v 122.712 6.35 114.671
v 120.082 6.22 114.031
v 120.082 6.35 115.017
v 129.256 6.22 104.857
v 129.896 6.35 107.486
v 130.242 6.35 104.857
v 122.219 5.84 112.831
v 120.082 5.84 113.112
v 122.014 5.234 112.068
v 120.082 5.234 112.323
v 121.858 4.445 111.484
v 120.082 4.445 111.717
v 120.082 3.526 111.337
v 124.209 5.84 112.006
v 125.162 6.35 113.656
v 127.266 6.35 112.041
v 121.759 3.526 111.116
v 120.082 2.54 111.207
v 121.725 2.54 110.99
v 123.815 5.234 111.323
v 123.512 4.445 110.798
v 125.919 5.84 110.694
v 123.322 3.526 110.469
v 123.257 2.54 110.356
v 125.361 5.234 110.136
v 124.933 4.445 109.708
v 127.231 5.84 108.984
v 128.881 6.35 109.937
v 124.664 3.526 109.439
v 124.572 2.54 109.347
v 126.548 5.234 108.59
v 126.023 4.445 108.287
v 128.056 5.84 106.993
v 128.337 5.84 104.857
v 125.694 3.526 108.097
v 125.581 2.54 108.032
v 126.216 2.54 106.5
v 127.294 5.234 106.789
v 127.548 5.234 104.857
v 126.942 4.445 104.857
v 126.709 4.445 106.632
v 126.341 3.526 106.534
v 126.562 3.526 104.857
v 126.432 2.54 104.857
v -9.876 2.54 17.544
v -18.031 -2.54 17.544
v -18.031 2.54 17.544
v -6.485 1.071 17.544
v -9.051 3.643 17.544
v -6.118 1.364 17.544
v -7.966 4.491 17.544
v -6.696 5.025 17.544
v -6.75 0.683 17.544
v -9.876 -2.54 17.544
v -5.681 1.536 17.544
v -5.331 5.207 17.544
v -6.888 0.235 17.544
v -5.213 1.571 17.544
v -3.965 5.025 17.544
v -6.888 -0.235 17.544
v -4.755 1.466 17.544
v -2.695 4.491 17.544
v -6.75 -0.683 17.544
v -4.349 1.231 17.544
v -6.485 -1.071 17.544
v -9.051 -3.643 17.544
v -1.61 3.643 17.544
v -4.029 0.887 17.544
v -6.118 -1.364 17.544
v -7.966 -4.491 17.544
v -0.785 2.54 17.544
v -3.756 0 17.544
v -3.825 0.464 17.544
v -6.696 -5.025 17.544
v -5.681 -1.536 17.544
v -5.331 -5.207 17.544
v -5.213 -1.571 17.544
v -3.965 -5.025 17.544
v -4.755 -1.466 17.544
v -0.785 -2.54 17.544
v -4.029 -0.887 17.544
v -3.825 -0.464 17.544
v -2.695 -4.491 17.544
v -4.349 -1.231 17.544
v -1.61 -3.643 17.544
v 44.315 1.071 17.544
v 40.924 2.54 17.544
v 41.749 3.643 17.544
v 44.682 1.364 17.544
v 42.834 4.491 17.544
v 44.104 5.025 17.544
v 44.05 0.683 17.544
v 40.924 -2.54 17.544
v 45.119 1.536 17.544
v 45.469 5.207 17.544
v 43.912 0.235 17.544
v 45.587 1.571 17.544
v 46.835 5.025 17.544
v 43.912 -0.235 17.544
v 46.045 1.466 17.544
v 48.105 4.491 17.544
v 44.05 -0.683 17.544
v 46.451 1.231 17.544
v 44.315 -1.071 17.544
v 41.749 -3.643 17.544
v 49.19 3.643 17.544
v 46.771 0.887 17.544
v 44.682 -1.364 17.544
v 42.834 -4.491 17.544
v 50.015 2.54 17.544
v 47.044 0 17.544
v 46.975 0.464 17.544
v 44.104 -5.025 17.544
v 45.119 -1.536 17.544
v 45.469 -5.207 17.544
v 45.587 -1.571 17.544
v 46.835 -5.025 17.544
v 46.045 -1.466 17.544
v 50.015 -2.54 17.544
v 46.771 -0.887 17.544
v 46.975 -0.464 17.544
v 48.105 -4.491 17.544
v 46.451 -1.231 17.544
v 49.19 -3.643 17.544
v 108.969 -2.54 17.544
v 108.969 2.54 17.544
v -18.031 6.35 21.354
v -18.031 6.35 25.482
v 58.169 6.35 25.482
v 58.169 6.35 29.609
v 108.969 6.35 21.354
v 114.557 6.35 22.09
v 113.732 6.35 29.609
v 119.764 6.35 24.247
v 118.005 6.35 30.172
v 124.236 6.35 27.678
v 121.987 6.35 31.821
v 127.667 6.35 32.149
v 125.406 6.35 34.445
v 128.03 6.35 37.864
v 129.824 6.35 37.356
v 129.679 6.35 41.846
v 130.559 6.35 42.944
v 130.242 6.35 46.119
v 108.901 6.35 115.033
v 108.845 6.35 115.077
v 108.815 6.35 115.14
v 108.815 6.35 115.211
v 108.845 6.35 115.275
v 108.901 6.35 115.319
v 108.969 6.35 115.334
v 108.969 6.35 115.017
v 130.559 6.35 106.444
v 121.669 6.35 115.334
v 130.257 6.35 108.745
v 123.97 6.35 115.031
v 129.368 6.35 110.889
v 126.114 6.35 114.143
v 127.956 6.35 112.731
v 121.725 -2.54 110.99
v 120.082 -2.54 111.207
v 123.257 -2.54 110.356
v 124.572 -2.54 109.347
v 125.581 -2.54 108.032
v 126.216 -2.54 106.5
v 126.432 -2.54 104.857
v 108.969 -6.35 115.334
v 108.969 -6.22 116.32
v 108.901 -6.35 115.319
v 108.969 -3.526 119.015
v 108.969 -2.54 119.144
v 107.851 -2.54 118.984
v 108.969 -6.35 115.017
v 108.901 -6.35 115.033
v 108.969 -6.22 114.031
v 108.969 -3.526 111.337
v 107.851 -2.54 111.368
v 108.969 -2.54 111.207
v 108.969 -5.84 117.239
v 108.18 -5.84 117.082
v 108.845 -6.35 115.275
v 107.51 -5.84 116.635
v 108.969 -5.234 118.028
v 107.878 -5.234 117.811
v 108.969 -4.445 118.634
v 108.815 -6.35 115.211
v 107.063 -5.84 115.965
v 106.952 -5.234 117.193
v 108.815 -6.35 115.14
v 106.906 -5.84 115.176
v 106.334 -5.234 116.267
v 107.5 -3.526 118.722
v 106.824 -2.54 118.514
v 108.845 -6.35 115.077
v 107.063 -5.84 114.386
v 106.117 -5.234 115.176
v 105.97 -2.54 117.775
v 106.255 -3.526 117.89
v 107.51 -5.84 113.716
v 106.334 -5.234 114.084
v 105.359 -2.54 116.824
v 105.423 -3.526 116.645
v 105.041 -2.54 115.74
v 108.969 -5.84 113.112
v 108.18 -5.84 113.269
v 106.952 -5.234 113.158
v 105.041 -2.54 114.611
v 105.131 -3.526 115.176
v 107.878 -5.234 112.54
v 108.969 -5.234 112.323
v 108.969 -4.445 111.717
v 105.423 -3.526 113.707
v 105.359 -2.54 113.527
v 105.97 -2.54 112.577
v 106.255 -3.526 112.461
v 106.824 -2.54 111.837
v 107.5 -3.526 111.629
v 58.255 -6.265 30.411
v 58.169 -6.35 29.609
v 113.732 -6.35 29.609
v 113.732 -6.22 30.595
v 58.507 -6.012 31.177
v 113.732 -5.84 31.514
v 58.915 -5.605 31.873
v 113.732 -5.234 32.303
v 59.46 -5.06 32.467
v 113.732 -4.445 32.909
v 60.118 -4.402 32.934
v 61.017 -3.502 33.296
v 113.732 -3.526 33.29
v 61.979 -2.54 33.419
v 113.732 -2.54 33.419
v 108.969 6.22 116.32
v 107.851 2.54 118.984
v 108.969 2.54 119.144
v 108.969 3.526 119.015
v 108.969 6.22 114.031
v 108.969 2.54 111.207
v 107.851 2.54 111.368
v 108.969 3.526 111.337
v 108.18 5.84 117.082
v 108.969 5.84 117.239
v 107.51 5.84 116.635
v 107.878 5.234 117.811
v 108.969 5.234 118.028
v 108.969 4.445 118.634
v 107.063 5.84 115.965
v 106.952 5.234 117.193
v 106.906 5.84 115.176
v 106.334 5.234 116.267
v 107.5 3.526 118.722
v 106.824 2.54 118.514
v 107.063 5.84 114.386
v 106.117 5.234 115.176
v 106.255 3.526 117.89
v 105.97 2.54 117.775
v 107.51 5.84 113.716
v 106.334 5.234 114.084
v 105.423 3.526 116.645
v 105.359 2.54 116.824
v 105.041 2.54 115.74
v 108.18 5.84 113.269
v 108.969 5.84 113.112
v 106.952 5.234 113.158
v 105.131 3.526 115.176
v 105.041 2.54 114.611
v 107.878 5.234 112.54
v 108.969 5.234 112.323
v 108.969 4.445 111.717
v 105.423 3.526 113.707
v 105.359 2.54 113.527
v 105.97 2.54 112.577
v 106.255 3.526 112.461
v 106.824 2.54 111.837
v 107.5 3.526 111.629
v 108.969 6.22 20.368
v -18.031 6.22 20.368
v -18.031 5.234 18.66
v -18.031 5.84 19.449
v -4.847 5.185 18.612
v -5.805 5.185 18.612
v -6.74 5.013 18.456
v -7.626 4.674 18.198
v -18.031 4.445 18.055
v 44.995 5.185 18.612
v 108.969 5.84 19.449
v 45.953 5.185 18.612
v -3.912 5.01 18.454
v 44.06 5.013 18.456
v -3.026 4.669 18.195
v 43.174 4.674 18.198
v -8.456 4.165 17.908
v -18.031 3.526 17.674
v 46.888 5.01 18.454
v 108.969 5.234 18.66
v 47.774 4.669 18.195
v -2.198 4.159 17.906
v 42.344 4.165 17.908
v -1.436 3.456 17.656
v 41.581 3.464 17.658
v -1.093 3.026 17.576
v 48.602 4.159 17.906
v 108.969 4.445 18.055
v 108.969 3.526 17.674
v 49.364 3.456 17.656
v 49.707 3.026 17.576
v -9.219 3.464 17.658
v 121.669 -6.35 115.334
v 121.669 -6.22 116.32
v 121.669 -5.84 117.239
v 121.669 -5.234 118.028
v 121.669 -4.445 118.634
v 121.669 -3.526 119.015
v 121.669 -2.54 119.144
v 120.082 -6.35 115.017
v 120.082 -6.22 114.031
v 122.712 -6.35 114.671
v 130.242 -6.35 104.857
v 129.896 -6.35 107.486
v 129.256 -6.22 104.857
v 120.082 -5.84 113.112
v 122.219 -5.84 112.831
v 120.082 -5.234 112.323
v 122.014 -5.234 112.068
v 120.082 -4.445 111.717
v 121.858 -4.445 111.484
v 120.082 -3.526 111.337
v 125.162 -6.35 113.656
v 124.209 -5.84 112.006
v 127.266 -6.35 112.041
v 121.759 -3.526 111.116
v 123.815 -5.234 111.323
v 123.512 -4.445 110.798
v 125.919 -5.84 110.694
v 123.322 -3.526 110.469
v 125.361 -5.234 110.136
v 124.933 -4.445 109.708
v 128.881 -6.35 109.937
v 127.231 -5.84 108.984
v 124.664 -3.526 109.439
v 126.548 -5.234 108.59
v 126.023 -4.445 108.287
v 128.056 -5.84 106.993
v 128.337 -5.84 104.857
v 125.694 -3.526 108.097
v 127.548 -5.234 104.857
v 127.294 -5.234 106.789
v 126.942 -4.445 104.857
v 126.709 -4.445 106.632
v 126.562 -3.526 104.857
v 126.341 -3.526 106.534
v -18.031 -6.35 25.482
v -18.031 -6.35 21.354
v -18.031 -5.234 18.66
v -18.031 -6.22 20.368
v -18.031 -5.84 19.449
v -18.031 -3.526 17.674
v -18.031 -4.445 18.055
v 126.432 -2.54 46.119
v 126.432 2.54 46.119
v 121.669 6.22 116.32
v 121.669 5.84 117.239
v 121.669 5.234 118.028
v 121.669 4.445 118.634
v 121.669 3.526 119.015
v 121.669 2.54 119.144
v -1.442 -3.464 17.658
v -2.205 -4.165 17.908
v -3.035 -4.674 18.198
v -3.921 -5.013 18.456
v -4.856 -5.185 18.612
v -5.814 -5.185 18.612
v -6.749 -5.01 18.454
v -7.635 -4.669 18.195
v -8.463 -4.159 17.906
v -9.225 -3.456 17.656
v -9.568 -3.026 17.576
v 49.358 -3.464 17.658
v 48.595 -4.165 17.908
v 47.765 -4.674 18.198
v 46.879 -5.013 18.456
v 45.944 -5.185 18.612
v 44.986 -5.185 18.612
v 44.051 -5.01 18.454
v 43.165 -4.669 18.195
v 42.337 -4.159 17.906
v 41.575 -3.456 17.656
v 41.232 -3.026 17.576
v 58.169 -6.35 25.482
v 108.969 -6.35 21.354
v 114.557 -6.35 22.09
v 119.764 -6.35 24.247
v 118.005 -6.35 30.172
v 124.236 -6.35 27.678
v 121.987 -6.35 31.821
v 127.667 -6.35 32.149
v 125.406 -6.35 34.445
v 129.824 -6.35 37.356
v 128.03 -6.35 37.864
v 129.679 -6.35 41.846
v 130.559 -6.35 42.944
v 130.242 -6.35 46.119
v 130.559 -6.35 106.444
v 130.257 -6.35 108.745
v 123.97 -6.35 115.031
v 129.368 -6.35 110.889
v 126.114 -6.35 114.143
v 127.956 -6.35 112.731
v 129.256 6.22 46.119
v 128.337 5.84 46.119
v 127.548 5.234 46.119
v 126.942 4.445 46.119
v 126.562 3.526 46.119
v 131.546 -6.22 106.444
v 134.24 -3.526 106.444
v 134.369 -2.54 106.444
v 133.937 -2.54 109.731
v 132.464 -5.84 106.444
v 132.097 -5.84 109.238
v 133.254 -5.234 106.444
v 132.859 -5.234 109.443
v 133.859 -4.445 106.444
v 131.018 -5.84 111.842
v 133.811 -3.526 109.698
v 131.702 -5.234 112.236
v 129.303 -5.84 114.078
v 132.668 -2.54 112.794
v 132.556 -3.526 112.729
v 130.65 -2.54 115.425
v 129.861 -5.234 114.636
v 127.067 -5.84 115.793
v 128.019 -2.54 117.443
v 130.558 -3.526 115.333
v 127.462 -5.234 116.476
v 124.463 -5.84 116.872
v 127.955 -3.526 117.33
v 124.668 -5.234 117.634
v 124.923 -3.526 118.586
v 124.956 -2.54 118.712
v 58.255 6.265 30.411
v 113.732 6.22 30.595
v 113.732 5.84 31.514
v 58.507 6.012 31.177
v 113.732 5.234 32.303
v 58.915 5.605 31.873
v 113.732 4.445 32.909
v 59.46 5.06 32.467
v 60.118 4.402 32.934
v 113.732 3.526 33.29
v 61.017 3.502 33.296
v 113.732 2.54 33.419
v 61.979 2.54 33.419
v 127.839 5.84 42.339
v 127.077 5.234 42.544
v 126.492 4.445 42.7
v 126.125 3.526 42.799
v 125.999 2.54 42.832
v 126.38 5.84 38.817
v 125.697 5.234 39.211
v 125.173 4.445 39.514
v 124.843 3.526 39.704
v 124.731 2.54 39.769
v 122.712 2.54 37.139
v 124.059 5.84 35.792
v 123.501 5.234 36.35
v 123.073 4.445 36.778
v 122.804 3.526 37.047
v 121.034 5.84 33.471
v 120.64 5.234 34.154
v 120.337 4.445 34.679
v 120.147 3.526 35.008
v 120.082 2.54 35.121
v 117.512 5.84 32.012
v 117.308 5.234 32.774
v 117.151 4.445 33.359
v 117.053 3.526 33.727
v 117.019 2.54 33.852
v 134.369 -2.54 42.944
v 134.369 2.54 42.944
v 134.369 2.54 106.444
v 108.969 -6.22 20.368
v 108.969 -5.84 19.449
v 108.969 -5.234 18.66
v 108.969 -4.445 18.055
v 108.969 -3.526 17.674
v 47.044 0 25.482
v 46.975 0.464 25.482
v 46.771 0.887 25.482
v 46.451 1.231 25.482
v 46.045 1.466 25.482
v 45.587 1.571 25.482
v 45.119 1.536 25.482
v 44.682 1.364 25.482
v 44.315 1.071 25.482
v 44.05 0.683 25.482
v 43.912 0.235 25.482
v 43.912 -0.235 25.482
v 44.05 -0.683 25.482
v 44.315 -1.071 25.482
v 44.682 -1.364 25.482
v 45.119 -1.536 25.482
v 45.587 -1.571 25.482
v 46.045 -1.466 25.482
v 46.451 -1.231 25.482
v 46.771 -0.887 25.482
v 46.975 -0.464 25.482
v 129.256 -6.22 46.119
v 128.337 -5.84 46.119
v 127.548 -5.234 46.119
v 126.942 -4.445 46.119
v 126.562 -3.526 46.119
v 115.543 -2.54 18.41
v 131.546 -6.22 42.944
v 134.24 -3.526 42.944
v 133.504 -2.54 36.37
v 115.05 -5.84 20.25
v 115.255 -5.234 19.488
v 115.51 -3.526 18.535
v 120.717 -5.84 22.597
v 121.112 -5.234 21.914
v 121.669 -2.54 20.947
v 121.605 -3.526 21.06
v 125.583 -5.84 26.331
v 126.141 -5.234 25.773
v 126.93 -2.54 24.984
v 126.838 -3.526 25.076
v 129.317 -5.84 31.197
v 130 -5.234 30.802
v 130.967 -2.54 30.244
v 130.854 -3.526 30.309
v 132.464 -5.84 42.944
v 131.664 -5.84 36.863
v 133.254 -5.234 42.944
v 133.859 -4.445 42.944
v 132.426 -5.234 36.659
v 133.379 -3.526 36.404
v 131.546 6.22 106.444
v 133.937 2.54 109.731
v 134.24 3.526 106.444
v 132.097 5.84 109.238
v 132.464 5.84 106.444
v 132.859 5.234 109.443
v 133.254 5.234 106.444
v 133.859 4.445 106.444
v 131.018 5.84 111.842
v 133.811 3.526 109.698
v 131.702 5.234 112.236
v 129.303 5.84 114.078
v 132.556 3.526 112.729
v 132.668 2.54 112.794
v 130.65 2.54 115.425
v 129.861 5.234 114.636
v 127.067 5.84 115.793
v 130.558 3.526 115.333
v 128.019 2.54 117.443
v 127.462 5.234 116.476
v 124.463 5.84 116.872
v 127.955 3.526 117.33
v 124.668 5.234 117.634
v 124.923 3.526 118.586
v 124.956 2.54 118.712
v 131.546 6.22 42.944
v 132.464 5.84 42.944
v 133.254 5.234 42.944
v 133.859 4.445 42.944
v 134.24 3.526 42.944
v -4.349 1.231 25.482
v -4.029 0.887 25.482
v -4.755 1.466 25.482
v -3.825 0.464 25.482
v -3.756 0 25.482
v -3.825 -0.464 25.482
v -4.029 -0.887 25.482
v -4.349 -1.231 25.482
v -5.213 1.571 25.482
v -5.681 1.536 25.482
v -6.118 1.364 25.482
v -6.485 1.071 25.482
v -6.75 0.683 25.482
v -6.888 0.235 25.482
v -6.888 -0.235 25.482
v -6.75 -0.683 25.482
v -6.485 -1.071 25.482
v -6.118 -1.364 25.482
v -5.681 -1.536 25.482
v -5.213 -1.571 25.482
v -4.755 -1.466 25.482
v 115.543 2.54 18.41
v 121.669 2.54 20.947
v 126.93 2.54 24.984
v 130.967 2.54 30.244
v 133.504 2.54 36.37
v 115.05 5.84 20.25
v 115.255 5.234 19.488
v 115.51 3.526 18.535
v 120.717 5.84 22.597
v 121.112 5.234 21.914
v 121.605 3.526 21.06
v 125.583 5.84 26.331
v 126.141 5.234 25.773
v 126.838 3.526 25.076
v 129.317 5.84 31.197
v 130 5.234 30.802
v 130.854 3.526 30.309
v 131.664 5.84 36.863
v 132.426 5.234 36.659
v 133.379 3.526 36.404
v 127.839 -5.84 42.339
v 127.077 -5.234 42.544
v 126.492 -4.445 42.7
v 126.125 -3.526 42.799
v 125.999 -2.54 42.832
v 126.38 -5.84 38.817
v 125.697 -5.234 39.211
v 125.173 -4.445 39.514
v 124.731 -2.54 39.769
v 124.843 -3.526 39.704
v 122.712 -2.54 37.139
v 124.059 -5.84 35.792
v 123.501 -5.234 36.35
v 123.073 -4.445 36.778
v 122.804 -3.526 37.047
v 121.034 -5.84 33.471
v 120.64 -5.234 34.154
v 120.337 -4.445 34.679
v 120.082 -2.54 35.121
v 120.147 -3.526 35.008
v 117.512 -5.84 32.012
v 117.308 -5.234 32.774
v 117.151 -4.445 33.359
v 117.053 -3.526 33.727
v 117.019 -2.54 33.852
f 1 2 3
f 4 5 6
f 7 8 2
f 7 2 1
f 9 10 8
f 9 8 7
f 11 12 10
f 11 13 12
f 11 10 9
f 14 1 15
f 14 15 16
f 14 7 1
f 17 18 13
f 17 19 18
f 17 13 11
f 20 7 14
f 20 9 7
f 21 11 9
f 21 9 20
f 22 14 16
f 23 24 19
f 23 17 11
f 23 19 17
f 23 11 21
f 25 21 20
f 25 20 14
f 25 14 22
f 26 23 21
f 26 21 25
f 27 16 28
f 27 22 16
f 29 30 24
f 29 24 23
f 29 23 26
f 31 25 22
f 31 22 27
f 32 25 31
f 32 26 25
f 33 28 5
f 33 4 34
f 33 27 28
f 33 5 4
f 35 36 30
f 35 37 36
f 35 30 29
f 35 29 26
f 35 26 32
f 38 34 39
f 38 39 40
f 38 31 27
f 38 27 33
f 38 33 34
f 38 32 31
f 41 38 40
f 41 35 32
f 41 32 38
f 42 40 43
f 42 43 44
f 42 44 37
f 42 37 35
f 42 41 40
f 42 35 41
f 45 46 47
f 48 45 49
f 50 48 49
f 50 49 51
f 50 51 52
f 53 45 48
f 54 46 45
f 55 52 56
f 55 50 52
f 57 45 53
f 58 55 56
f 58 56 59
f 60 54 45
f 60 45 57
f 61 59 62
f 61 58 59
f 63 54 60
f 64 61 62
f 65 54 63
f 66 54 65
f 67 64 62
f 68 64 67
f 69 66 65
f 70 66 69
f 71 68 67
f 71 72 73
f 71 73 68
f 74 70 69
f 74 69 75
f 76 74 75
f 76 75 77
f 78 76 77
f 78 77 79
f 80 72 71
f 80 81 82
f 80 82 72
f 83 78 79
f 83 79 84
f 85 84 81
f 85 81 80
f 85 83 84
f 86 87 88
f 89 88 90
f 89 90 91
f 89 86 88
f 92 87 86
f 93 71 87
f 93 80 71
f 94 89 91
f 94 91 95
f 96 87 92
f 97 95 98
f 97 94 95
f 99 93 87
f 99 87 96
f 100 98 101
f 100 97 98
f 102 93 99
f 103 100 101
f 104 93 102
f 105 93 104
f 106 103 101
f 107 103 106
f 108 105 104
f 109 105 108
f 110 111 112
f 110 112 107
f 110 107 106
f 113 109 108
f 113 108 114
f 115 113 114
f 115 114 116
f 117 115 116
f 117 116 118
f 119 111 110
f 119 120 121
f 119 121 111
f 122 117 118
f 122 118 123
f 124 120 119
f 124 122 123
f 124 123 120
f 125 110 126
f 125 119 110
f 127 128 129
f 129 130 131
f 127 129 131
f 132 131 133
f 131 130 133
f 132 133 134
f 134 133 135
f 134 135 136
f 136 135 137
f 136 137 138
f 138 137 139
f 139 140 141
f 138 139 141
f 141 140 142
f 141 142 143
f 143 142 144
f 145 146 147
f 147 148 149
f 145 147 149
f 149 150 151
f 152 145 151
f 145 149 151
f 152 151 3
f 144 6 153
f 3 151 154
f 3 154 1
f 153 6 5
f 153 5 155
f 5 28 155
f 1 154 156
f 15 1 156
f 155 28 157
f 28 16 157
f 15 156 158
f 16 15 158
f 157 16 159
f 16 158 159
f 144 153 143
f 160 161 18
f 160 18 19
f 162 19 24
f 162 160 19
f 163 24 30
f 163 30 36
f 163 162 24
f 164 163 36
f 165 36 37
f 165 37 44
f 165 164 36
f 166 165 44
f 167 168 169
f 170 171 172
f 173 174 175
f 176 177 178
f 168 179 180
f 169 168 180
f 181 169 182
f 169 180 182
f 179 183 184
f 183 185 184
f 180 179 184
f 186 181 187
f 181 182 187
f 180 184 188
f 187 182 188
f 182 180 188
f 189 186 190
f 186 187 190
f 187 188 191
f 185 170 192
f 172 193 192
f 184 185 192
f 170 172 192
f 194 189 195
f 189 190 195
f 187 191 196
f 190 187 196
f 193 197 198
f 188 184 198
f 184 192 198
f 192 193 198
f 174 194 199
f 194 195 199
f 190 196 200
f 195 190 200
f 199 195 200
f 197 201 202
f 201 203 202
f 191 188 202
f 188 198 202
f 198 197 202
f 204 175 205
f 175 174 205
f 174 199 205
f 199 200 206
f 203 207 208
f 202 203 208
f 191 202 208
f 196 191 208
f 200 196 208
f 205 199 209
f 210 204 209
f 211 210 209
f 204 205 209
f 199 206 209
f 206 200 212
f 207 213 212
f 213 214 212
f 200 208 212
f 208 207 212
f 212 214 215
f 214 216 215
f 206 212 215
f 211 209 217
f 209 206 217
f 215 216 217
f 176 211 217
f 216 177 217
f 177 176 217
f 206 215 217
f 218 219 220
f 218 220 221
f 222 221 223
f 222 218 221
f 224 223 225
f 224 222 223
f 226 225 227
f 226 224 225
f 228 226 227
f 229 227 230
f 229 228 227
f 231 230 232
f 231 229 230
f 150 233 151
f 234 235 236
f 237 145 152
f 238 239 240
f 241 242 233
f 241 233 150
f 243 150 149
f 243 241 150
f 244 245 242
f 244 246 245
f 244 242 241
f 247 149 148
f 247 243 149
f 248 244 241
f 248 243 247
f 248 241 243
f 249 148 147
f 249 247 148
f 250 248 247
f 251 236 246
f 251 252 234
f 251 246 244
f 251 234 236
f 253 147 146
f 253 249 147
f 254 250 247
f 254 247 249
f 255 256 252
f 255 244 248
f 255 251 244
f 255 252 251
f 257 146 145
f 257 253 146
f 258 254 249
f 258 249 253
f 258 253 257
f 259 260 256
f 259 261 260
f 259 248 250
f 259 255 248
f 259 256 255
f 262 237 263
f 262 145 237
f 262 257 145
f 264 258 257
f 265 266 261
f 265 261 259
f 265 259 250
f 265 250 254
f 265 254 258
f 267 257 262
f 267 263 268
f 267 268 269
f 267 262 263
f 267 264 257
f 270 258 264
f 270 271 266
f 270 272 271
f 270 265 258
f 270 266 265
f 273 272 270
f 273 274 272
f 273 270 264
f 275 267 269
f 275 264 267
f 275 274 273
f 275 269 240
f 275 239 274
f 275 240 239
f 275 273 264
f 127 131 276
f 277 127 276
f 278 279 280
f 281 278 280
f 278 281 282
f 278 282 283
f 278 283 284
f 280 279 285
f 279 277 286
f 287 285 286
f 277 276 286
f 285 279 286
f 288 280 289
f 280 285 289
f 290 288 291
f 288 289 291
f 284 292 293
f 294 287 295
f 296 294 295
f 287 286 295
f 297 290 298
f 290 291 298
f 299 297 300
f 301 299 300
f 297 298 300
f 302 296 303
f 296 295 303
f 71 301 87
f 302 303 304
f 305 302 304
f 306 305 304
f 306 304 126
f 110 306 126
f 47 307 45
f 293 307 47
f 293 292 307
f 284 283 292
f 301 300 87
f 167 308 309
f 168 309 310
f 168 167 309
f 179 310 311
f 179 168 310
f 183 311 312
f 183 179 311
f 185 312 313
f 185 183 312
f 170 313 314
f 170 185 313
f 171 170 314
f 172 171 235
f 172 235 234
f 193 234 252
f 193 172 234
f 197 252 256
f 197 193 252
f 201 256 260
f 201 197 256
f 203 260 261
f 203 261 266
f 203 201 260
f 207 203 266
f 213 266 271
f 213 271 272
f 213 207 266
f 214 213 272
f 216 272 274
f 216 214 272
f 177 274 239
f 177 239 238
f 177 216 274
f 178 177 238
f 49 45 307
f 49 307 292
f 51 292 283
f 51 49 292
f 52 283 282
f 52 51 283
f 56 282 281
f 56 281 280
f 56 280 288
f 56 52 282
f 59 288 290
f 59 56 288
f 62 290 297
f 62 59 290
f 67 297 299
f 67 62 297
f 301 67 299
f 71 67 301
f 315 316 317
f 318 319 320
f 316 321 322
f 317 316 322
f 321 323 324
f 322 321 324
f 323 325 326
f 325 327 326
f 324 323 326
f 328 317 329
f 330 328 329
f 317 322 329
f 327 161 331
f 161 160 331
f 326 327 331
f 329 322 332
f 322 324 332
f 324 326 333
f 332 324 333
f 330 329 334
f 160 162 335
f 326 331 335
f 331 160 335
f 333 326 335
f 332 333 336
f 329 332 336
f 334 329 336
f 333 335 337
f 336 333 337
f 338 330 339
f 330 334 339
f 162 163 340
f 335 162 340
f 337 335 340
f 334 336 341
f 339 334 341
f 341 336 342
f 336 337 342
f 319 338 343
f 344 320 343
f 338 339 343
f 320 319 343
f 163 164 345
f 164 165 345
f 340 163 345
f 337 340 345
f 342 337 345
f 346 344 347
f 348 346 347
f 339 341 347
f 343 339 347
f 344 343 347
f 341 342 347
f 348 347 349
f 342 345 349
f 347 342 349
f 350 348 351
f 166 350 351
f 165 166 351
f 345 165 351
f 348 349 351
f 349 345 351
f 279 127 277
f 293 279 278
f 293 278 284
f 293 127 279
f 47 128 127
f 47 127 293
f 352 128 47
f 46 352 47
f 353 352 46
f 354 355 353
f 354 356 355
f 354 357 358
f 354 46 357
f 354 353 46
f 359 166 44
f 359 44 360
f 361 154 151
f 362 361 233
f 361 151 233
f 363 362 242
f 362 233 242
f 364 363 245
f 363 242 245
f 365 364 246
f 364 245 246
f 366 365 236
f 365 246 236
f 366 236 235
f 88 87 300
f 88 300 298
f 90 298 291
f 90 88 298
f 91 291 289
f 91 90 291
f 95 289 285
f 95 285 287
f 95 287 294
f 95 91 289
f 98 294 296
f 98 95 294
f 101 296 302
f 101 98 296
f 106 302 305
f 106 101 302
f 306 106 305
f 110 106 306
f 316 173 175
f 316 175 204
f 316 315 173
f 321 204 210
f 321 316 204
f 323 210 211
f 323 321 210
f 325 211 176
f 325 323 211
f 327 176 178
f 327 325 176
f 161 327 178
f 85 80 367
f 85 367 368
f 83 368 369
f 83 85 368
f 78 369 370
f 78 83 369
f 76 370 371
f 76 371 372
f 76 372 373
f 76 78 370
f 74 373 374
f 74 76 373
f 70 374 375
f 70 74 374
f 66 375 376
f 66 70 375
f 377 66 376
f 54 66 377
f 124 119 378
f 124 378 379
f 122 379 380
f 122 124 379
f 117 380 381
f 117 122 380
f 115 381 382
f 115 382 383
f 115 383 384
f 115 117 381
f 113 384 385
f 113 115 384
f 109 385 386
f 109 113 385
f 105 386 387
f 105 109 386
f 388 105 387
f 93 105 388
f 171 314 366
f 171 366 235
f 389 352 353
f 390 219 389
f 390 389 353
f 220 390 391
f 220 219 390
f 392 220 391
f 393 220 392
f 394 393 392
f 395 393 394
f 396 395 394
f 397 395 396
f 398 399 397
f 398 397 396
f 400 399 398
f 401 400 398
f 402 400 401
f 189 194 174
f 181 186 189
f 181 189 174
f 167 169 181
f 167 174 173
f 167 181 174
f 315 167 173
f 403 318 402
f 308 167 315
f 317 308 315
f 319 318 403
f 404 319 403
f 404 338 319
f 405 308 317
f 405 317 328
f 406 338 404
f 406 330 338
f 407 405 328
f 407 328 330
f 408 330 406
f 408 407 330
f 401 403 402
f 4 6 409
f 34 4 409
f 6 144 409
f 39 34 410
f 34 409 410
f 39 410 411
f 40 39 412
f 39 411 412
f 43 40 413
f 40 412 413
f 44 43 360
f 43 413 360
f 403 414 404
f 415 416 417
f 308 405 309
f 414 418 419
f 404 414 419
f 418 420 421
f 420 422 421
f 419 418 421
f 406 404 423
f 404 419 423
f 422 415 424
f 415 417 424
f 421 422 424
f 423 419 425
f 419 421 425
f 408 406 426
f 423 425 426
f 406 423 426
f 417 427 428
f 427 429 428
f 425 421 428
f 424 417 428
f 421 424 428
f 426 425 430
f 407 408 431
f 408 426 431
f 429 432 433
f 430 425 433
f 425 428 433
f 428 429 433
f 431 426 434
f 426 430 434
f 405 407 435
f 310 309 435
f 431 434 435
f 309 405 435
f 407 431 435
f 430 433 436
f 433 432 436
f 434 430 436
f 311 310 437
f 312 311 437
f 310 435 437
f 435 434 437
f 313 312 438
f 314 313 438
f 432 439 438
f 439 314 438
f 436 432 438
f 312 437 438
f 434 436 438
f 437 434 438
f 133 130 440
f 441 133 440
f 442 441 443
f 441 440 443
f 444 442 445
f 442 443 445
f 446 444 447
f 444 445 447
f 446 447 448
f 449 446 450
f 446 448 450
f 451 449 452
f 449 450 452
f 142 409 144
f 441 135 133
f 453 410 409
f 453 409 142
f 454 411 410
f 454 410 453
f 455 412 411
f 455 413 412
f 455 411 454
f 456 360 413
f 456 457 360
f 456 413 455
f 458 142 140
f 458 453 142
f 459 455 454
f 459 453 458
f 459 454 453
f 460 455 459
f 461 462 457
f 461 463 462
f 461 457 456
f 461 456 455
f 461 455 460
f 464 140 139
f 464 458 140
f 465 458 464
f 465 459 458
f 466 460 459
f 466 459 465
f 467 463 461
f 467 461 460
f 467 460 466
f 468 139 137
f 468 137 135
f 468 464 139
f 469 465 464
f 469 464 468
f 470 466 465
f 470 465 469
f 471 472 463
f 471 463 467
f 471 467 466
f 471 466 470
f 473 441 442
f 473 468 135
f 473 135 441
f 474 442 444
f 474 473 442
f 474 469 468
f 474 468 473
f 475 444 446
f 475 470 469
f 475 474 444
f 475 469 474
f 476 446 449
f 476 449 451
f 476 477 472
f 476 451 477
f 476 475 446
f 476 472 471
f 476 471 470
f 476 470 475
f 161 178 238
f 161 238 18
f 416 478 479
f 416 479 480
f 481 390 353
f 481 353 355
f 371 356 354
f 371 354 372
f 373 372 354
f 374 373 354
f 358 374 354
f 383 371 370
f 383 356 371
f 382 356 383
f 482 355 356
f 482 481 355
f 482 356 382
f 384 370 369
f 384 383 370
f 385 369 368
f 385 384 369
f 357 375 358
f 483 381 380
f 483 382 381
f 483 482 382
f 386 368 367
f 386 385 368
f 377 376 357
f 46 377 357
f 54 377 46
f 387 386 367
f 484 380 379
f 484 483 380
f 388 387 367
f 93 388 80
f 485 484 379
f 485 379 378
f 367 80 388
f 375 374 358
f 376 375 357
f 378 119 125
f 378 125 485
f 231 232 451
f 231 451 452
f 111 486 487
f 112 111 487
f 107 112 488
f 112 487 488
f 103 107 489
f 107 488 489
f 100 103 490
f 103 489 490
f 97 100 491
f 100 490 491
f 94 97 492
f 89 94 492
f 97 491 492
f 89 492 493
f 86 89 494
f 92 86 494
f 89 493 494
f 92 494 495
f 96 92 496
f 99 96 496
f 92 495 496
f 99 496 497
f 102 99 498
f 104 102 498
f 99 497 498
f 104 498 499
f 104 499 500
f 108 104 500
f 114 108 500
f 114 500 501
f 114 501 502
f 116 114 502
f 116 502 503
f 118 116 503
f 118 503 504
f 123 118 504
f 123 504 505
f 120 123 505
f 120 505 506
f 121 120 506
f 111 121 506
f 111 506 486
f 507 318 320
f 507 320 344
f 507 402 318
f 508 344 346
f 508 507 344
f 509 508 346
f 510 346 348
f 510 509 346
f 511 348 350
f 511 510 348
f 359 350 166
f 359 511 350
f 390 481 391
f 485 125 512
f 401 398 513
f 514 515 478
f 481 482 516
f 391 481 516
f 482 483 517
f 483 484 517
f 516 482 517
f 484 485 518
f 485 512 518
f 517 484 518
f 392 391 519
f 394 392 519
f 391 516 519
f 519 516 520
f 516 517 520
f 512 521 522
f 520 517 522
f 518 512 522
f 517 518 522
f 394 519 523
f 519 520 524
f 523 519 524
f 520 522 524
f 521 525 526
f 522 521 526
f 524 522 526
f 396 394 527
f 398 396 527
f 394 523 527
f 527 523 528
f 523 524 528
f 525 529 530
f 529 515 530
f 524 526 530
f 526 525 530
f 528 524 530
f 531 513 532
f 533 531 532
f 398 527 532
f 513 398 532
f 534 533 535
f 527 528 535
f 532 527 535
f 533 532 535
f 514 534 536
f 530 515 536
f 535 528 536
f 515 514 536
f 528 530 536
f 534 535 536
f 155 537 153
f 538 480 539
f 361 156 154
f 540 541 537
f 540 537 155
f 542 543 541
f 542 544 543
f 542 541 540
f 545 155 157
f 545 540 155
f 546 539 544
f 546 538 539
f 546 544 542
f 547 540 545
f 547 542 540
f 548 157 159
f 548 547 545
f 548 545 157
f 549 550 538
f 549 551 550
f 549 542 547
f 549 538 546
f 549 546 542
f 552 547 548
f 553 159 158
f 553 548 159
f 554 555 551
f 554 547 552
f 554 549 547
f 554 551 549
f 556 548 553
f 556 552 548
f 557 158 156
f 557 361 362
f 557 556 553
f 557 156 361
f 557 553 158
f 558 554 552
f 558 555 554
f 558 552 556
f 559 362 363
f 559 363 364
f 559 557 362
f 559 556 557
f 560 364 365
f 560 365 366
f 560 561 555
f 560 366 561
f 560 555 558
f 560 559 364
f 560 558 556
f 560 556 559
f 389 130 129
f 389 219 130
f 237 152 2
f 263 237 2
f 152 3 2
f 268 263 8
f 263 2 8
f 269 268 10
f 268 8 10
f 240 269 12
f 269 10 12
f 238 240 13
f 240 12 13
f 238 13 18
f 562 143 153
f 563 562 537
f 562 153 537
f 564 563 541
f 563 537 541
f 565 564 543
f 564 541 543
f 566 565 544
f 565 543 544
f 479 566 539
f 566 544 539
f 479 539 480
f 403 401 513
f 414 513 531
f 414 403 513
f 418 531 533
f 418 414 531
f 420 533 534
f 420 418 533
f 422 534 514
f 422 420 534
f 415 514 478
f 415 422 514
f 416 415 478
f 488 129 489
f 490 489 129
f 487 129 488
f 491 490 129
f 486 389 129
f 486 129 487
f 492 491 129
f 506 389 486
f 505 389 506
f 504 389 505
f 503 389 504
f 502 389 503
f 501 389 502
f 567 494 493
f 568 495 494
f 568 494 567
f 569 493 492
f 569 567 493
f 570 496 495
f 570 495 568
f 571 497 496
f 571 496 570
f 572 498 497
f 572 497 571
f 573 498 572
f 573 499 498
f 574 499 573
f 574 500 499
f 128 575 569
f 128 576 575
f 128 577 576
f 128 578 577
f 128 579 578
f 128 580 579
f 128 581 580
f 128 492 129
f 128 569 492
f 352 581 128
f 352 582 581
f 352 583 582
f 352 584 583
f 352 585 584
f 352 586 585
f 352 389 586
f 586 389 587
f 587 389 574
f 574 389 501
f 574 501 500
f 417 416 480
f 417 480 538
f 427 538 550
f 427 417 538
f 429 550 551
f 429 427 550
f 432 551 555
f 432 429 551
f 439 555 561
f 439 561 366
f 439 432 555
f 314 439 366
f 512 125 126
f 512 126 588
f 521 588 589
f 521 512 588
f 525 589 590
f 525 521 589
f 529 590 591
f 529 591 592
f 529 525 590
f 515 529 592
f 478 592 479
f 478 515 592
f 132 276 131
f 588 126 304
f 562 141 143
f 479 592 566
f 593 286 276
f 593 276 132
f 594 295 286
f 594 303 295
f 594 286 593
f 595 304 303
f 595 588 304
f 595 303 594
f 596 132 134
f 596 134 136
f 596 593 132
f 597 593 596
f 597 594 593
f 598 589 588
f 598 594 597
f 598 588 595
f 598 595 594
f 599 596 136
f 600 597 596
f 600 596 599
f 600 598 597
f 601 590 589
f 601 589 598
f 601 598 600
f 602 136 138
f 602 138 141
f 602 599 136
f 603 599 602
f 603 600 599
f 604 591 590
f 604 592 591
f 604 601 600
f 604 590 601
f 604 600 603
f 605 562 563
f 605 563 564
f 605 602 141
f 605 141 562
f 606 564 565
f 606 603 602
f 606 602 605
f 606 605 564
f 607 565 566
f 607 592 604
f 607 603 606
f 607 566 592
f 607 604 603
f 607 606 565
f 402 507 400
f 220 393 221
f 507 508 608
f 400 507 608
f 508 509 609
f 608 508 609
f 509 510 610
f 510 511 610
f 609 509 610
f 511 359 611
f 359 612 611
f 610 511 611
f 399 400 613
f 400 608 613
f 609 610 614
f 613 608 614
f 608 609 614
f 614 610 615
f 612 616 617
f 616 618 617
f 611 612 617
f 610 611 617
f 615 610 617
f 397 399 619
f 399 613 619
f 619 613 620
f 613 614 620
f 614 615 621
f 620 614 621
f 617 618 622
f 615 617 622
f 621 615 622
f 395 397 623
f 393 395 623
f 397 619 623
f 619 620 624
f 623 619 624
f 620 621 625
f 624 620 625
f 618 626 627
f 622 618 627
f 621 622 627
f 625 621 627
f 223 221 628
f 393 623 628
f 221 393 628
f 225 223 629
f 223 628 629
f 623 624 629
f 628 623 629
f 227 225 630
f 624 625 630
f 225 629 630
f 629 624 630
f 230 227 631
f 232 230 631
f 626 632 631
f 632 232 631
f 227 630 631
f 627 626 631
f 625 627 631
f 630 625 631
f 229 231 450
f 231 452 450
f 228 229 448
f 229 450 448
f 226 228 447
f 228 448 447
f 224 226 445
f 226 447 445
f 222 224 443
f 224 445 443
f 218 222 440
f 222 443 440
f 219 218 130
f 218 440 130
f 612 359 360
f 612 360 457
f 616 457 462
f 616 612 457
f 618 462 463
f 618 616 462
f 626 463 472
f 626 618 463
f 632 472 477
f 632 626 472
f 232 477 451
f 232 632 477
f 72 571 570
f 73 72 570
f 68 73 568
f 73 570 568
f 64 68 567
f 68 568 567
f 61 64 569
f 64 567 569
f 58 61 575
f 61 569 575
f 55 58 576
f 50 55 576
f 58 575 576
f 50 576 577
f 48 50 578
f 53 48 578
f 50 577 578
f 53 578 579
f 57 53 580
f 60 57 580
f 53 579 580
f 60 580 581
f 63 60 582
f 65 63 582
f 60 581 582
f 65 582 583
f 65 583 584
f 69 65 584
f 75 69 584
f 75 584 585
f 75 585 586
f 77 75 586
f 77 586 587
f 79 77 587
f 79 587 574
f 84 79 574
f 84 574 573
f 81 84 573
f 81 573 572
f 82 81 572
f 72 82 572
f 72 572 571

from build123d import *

# Parameters (mm, degrees)
F1_DEPTH = 6.35
F2_R     = 1.575
F3_DEPTH = 7.9385
F4_R     = 3.81
F5_R     = 5.207
F5_R_2   = 1.642683843
F5_R_3   = 1.6124121995
F6_DEPTH = 7.9375


with BuildPart() as f1:
    # F0 (on Front) → F1 (new body, symmetric)
    with BuildSketch(Plane.XZ):
        with BuildLine():
            Line((-18.0305134643, 25.4818645348), (-18.0305134643, 17.5443645348))
            Line((-18.0305134643, 17.5443645348), (108.9694865357, 17.5443645348))
            ThreePointArc((108.9694865357, 17.5443645348), (126.9299987779, 24.9838522926), (134.3694865357, 42.9443645348))
            Line((134.3694865357, 42.9443645348), (134.3694865357, 106.4443645348))
            ThreePointArc((134.3694865357, 106.4443645348), (130.6497426568, 115.4246206558), (121.6694865357, 119.1443645348))
            Line((121.6694865357, 119.1443645348), (108.9694865357, 119.1443645348))
            ThreePointArc((108.9694865357, 119.1443645348), (105.0007365357, 115.1756145348), (108.9694865357, 111.2068645348))
            Line((108.9694865357, 111.2068645348), (120.0819865357, 111.2068645348))
            ThreePointArc((120.0819865357, 111.2068645348), (124.5721145963, 109.3469925953), (126.4319865357, 104.8568645348))
            Line((126.4319865357, 104.8568645348), (126.4319865357, 46.1193645348))
            ThreePointArc((126.4319865357, 46.1193645348), (122.7122426568, 37.1391084137), (113.7319865357, 33.4193645348))
            Line((113.7319865357, 33.4193645348), (58.1694865357, 33.4193645348))
            Line((58.1694865357, 33.4193645348), (58.1694865357, 25.4818645348))
            Line((58.1694865357, 25.4818645348), (-18.0305134643, 25.4818645348))
        make_face()
    extrude(amount=F1_DEPTH, both=True)

    # F2 (on face) → F3 (cut, through all)
    with BuildSketch(Plane.XY.offset(25.4818645348)):
        with Locations((45.4694865357, 0)):
            Circle(F2_R)
        with Locations((-5.3305134643, 0)):
            Circle(F2_R)
    extrude(amount=-F3_DEPTH, mode=Mode.SUBTRACT)

    # F4
    f4_edges = [f1.edges().sort_by_distance(p)[0] for p in [
        (126.431987, 6.35, 75.488115),
        (126.431987, -6.35, 75.488115),
        (124.572115, -6.35, 109.346993),
        (124.572115, 6.35, 109.346993),
        (122.712243, -6.35, 37.139108),
        (122.712243, 6.35, 37.139108),
        (85.950737, 6.35, 33.419365),
        (85.950737, -6.35, 33.419365),
        (58.169487, 0, 33.419365),
        (114.525737, 6.35, 111.206865),
        (114.525737, -6.35, 111.206865),
        (105.000737, -6.35, 115.175615),
        (105.000737, 6.35, 115.175615),
        (115.319487, 6.35, 119.144365),
        (115.319487, -6.35, 119.144365),
        (130.649743, 6.35, 115.424621),
        (134.369487, 6.35, 74.694365),
        (134.369487, -6.35, 74.694365),
        (130.649743, -6.35, 115.424621),
        (126.929999, 6.35, 24.983852),
        (126.929999, -6.35, 24.983852),
        (45.469487, 6.35, 17.544365),
        (45.469487, -6.35, 17.544365),
    ]]
    fillet(f4_edges, radius=F4_R)

    # F5 (on face) → F6 (join, through all)
    with BuildSketch(Plane(origin=(0, 0, 17.5443645348), x_dir=(1, 0, 0), z_dir=(0, 0, -1))):
        with Locations((-5.3305134643, 0)):
            Circle(F5_R)
        with Locations((-5.3305134643, 0)):
            Circle(F5_R_2, mode=Mode.SUBTRACT)
        with Locations((45.4694865357, 0)):
            Circle(F5_R)
        with Locations((45.4694865357, 0)):
            Circle(F5_R_3, mode=Mode.SUBTRACT)
    extrude(amount=-F6_DEPTH)


solid = f1.part
